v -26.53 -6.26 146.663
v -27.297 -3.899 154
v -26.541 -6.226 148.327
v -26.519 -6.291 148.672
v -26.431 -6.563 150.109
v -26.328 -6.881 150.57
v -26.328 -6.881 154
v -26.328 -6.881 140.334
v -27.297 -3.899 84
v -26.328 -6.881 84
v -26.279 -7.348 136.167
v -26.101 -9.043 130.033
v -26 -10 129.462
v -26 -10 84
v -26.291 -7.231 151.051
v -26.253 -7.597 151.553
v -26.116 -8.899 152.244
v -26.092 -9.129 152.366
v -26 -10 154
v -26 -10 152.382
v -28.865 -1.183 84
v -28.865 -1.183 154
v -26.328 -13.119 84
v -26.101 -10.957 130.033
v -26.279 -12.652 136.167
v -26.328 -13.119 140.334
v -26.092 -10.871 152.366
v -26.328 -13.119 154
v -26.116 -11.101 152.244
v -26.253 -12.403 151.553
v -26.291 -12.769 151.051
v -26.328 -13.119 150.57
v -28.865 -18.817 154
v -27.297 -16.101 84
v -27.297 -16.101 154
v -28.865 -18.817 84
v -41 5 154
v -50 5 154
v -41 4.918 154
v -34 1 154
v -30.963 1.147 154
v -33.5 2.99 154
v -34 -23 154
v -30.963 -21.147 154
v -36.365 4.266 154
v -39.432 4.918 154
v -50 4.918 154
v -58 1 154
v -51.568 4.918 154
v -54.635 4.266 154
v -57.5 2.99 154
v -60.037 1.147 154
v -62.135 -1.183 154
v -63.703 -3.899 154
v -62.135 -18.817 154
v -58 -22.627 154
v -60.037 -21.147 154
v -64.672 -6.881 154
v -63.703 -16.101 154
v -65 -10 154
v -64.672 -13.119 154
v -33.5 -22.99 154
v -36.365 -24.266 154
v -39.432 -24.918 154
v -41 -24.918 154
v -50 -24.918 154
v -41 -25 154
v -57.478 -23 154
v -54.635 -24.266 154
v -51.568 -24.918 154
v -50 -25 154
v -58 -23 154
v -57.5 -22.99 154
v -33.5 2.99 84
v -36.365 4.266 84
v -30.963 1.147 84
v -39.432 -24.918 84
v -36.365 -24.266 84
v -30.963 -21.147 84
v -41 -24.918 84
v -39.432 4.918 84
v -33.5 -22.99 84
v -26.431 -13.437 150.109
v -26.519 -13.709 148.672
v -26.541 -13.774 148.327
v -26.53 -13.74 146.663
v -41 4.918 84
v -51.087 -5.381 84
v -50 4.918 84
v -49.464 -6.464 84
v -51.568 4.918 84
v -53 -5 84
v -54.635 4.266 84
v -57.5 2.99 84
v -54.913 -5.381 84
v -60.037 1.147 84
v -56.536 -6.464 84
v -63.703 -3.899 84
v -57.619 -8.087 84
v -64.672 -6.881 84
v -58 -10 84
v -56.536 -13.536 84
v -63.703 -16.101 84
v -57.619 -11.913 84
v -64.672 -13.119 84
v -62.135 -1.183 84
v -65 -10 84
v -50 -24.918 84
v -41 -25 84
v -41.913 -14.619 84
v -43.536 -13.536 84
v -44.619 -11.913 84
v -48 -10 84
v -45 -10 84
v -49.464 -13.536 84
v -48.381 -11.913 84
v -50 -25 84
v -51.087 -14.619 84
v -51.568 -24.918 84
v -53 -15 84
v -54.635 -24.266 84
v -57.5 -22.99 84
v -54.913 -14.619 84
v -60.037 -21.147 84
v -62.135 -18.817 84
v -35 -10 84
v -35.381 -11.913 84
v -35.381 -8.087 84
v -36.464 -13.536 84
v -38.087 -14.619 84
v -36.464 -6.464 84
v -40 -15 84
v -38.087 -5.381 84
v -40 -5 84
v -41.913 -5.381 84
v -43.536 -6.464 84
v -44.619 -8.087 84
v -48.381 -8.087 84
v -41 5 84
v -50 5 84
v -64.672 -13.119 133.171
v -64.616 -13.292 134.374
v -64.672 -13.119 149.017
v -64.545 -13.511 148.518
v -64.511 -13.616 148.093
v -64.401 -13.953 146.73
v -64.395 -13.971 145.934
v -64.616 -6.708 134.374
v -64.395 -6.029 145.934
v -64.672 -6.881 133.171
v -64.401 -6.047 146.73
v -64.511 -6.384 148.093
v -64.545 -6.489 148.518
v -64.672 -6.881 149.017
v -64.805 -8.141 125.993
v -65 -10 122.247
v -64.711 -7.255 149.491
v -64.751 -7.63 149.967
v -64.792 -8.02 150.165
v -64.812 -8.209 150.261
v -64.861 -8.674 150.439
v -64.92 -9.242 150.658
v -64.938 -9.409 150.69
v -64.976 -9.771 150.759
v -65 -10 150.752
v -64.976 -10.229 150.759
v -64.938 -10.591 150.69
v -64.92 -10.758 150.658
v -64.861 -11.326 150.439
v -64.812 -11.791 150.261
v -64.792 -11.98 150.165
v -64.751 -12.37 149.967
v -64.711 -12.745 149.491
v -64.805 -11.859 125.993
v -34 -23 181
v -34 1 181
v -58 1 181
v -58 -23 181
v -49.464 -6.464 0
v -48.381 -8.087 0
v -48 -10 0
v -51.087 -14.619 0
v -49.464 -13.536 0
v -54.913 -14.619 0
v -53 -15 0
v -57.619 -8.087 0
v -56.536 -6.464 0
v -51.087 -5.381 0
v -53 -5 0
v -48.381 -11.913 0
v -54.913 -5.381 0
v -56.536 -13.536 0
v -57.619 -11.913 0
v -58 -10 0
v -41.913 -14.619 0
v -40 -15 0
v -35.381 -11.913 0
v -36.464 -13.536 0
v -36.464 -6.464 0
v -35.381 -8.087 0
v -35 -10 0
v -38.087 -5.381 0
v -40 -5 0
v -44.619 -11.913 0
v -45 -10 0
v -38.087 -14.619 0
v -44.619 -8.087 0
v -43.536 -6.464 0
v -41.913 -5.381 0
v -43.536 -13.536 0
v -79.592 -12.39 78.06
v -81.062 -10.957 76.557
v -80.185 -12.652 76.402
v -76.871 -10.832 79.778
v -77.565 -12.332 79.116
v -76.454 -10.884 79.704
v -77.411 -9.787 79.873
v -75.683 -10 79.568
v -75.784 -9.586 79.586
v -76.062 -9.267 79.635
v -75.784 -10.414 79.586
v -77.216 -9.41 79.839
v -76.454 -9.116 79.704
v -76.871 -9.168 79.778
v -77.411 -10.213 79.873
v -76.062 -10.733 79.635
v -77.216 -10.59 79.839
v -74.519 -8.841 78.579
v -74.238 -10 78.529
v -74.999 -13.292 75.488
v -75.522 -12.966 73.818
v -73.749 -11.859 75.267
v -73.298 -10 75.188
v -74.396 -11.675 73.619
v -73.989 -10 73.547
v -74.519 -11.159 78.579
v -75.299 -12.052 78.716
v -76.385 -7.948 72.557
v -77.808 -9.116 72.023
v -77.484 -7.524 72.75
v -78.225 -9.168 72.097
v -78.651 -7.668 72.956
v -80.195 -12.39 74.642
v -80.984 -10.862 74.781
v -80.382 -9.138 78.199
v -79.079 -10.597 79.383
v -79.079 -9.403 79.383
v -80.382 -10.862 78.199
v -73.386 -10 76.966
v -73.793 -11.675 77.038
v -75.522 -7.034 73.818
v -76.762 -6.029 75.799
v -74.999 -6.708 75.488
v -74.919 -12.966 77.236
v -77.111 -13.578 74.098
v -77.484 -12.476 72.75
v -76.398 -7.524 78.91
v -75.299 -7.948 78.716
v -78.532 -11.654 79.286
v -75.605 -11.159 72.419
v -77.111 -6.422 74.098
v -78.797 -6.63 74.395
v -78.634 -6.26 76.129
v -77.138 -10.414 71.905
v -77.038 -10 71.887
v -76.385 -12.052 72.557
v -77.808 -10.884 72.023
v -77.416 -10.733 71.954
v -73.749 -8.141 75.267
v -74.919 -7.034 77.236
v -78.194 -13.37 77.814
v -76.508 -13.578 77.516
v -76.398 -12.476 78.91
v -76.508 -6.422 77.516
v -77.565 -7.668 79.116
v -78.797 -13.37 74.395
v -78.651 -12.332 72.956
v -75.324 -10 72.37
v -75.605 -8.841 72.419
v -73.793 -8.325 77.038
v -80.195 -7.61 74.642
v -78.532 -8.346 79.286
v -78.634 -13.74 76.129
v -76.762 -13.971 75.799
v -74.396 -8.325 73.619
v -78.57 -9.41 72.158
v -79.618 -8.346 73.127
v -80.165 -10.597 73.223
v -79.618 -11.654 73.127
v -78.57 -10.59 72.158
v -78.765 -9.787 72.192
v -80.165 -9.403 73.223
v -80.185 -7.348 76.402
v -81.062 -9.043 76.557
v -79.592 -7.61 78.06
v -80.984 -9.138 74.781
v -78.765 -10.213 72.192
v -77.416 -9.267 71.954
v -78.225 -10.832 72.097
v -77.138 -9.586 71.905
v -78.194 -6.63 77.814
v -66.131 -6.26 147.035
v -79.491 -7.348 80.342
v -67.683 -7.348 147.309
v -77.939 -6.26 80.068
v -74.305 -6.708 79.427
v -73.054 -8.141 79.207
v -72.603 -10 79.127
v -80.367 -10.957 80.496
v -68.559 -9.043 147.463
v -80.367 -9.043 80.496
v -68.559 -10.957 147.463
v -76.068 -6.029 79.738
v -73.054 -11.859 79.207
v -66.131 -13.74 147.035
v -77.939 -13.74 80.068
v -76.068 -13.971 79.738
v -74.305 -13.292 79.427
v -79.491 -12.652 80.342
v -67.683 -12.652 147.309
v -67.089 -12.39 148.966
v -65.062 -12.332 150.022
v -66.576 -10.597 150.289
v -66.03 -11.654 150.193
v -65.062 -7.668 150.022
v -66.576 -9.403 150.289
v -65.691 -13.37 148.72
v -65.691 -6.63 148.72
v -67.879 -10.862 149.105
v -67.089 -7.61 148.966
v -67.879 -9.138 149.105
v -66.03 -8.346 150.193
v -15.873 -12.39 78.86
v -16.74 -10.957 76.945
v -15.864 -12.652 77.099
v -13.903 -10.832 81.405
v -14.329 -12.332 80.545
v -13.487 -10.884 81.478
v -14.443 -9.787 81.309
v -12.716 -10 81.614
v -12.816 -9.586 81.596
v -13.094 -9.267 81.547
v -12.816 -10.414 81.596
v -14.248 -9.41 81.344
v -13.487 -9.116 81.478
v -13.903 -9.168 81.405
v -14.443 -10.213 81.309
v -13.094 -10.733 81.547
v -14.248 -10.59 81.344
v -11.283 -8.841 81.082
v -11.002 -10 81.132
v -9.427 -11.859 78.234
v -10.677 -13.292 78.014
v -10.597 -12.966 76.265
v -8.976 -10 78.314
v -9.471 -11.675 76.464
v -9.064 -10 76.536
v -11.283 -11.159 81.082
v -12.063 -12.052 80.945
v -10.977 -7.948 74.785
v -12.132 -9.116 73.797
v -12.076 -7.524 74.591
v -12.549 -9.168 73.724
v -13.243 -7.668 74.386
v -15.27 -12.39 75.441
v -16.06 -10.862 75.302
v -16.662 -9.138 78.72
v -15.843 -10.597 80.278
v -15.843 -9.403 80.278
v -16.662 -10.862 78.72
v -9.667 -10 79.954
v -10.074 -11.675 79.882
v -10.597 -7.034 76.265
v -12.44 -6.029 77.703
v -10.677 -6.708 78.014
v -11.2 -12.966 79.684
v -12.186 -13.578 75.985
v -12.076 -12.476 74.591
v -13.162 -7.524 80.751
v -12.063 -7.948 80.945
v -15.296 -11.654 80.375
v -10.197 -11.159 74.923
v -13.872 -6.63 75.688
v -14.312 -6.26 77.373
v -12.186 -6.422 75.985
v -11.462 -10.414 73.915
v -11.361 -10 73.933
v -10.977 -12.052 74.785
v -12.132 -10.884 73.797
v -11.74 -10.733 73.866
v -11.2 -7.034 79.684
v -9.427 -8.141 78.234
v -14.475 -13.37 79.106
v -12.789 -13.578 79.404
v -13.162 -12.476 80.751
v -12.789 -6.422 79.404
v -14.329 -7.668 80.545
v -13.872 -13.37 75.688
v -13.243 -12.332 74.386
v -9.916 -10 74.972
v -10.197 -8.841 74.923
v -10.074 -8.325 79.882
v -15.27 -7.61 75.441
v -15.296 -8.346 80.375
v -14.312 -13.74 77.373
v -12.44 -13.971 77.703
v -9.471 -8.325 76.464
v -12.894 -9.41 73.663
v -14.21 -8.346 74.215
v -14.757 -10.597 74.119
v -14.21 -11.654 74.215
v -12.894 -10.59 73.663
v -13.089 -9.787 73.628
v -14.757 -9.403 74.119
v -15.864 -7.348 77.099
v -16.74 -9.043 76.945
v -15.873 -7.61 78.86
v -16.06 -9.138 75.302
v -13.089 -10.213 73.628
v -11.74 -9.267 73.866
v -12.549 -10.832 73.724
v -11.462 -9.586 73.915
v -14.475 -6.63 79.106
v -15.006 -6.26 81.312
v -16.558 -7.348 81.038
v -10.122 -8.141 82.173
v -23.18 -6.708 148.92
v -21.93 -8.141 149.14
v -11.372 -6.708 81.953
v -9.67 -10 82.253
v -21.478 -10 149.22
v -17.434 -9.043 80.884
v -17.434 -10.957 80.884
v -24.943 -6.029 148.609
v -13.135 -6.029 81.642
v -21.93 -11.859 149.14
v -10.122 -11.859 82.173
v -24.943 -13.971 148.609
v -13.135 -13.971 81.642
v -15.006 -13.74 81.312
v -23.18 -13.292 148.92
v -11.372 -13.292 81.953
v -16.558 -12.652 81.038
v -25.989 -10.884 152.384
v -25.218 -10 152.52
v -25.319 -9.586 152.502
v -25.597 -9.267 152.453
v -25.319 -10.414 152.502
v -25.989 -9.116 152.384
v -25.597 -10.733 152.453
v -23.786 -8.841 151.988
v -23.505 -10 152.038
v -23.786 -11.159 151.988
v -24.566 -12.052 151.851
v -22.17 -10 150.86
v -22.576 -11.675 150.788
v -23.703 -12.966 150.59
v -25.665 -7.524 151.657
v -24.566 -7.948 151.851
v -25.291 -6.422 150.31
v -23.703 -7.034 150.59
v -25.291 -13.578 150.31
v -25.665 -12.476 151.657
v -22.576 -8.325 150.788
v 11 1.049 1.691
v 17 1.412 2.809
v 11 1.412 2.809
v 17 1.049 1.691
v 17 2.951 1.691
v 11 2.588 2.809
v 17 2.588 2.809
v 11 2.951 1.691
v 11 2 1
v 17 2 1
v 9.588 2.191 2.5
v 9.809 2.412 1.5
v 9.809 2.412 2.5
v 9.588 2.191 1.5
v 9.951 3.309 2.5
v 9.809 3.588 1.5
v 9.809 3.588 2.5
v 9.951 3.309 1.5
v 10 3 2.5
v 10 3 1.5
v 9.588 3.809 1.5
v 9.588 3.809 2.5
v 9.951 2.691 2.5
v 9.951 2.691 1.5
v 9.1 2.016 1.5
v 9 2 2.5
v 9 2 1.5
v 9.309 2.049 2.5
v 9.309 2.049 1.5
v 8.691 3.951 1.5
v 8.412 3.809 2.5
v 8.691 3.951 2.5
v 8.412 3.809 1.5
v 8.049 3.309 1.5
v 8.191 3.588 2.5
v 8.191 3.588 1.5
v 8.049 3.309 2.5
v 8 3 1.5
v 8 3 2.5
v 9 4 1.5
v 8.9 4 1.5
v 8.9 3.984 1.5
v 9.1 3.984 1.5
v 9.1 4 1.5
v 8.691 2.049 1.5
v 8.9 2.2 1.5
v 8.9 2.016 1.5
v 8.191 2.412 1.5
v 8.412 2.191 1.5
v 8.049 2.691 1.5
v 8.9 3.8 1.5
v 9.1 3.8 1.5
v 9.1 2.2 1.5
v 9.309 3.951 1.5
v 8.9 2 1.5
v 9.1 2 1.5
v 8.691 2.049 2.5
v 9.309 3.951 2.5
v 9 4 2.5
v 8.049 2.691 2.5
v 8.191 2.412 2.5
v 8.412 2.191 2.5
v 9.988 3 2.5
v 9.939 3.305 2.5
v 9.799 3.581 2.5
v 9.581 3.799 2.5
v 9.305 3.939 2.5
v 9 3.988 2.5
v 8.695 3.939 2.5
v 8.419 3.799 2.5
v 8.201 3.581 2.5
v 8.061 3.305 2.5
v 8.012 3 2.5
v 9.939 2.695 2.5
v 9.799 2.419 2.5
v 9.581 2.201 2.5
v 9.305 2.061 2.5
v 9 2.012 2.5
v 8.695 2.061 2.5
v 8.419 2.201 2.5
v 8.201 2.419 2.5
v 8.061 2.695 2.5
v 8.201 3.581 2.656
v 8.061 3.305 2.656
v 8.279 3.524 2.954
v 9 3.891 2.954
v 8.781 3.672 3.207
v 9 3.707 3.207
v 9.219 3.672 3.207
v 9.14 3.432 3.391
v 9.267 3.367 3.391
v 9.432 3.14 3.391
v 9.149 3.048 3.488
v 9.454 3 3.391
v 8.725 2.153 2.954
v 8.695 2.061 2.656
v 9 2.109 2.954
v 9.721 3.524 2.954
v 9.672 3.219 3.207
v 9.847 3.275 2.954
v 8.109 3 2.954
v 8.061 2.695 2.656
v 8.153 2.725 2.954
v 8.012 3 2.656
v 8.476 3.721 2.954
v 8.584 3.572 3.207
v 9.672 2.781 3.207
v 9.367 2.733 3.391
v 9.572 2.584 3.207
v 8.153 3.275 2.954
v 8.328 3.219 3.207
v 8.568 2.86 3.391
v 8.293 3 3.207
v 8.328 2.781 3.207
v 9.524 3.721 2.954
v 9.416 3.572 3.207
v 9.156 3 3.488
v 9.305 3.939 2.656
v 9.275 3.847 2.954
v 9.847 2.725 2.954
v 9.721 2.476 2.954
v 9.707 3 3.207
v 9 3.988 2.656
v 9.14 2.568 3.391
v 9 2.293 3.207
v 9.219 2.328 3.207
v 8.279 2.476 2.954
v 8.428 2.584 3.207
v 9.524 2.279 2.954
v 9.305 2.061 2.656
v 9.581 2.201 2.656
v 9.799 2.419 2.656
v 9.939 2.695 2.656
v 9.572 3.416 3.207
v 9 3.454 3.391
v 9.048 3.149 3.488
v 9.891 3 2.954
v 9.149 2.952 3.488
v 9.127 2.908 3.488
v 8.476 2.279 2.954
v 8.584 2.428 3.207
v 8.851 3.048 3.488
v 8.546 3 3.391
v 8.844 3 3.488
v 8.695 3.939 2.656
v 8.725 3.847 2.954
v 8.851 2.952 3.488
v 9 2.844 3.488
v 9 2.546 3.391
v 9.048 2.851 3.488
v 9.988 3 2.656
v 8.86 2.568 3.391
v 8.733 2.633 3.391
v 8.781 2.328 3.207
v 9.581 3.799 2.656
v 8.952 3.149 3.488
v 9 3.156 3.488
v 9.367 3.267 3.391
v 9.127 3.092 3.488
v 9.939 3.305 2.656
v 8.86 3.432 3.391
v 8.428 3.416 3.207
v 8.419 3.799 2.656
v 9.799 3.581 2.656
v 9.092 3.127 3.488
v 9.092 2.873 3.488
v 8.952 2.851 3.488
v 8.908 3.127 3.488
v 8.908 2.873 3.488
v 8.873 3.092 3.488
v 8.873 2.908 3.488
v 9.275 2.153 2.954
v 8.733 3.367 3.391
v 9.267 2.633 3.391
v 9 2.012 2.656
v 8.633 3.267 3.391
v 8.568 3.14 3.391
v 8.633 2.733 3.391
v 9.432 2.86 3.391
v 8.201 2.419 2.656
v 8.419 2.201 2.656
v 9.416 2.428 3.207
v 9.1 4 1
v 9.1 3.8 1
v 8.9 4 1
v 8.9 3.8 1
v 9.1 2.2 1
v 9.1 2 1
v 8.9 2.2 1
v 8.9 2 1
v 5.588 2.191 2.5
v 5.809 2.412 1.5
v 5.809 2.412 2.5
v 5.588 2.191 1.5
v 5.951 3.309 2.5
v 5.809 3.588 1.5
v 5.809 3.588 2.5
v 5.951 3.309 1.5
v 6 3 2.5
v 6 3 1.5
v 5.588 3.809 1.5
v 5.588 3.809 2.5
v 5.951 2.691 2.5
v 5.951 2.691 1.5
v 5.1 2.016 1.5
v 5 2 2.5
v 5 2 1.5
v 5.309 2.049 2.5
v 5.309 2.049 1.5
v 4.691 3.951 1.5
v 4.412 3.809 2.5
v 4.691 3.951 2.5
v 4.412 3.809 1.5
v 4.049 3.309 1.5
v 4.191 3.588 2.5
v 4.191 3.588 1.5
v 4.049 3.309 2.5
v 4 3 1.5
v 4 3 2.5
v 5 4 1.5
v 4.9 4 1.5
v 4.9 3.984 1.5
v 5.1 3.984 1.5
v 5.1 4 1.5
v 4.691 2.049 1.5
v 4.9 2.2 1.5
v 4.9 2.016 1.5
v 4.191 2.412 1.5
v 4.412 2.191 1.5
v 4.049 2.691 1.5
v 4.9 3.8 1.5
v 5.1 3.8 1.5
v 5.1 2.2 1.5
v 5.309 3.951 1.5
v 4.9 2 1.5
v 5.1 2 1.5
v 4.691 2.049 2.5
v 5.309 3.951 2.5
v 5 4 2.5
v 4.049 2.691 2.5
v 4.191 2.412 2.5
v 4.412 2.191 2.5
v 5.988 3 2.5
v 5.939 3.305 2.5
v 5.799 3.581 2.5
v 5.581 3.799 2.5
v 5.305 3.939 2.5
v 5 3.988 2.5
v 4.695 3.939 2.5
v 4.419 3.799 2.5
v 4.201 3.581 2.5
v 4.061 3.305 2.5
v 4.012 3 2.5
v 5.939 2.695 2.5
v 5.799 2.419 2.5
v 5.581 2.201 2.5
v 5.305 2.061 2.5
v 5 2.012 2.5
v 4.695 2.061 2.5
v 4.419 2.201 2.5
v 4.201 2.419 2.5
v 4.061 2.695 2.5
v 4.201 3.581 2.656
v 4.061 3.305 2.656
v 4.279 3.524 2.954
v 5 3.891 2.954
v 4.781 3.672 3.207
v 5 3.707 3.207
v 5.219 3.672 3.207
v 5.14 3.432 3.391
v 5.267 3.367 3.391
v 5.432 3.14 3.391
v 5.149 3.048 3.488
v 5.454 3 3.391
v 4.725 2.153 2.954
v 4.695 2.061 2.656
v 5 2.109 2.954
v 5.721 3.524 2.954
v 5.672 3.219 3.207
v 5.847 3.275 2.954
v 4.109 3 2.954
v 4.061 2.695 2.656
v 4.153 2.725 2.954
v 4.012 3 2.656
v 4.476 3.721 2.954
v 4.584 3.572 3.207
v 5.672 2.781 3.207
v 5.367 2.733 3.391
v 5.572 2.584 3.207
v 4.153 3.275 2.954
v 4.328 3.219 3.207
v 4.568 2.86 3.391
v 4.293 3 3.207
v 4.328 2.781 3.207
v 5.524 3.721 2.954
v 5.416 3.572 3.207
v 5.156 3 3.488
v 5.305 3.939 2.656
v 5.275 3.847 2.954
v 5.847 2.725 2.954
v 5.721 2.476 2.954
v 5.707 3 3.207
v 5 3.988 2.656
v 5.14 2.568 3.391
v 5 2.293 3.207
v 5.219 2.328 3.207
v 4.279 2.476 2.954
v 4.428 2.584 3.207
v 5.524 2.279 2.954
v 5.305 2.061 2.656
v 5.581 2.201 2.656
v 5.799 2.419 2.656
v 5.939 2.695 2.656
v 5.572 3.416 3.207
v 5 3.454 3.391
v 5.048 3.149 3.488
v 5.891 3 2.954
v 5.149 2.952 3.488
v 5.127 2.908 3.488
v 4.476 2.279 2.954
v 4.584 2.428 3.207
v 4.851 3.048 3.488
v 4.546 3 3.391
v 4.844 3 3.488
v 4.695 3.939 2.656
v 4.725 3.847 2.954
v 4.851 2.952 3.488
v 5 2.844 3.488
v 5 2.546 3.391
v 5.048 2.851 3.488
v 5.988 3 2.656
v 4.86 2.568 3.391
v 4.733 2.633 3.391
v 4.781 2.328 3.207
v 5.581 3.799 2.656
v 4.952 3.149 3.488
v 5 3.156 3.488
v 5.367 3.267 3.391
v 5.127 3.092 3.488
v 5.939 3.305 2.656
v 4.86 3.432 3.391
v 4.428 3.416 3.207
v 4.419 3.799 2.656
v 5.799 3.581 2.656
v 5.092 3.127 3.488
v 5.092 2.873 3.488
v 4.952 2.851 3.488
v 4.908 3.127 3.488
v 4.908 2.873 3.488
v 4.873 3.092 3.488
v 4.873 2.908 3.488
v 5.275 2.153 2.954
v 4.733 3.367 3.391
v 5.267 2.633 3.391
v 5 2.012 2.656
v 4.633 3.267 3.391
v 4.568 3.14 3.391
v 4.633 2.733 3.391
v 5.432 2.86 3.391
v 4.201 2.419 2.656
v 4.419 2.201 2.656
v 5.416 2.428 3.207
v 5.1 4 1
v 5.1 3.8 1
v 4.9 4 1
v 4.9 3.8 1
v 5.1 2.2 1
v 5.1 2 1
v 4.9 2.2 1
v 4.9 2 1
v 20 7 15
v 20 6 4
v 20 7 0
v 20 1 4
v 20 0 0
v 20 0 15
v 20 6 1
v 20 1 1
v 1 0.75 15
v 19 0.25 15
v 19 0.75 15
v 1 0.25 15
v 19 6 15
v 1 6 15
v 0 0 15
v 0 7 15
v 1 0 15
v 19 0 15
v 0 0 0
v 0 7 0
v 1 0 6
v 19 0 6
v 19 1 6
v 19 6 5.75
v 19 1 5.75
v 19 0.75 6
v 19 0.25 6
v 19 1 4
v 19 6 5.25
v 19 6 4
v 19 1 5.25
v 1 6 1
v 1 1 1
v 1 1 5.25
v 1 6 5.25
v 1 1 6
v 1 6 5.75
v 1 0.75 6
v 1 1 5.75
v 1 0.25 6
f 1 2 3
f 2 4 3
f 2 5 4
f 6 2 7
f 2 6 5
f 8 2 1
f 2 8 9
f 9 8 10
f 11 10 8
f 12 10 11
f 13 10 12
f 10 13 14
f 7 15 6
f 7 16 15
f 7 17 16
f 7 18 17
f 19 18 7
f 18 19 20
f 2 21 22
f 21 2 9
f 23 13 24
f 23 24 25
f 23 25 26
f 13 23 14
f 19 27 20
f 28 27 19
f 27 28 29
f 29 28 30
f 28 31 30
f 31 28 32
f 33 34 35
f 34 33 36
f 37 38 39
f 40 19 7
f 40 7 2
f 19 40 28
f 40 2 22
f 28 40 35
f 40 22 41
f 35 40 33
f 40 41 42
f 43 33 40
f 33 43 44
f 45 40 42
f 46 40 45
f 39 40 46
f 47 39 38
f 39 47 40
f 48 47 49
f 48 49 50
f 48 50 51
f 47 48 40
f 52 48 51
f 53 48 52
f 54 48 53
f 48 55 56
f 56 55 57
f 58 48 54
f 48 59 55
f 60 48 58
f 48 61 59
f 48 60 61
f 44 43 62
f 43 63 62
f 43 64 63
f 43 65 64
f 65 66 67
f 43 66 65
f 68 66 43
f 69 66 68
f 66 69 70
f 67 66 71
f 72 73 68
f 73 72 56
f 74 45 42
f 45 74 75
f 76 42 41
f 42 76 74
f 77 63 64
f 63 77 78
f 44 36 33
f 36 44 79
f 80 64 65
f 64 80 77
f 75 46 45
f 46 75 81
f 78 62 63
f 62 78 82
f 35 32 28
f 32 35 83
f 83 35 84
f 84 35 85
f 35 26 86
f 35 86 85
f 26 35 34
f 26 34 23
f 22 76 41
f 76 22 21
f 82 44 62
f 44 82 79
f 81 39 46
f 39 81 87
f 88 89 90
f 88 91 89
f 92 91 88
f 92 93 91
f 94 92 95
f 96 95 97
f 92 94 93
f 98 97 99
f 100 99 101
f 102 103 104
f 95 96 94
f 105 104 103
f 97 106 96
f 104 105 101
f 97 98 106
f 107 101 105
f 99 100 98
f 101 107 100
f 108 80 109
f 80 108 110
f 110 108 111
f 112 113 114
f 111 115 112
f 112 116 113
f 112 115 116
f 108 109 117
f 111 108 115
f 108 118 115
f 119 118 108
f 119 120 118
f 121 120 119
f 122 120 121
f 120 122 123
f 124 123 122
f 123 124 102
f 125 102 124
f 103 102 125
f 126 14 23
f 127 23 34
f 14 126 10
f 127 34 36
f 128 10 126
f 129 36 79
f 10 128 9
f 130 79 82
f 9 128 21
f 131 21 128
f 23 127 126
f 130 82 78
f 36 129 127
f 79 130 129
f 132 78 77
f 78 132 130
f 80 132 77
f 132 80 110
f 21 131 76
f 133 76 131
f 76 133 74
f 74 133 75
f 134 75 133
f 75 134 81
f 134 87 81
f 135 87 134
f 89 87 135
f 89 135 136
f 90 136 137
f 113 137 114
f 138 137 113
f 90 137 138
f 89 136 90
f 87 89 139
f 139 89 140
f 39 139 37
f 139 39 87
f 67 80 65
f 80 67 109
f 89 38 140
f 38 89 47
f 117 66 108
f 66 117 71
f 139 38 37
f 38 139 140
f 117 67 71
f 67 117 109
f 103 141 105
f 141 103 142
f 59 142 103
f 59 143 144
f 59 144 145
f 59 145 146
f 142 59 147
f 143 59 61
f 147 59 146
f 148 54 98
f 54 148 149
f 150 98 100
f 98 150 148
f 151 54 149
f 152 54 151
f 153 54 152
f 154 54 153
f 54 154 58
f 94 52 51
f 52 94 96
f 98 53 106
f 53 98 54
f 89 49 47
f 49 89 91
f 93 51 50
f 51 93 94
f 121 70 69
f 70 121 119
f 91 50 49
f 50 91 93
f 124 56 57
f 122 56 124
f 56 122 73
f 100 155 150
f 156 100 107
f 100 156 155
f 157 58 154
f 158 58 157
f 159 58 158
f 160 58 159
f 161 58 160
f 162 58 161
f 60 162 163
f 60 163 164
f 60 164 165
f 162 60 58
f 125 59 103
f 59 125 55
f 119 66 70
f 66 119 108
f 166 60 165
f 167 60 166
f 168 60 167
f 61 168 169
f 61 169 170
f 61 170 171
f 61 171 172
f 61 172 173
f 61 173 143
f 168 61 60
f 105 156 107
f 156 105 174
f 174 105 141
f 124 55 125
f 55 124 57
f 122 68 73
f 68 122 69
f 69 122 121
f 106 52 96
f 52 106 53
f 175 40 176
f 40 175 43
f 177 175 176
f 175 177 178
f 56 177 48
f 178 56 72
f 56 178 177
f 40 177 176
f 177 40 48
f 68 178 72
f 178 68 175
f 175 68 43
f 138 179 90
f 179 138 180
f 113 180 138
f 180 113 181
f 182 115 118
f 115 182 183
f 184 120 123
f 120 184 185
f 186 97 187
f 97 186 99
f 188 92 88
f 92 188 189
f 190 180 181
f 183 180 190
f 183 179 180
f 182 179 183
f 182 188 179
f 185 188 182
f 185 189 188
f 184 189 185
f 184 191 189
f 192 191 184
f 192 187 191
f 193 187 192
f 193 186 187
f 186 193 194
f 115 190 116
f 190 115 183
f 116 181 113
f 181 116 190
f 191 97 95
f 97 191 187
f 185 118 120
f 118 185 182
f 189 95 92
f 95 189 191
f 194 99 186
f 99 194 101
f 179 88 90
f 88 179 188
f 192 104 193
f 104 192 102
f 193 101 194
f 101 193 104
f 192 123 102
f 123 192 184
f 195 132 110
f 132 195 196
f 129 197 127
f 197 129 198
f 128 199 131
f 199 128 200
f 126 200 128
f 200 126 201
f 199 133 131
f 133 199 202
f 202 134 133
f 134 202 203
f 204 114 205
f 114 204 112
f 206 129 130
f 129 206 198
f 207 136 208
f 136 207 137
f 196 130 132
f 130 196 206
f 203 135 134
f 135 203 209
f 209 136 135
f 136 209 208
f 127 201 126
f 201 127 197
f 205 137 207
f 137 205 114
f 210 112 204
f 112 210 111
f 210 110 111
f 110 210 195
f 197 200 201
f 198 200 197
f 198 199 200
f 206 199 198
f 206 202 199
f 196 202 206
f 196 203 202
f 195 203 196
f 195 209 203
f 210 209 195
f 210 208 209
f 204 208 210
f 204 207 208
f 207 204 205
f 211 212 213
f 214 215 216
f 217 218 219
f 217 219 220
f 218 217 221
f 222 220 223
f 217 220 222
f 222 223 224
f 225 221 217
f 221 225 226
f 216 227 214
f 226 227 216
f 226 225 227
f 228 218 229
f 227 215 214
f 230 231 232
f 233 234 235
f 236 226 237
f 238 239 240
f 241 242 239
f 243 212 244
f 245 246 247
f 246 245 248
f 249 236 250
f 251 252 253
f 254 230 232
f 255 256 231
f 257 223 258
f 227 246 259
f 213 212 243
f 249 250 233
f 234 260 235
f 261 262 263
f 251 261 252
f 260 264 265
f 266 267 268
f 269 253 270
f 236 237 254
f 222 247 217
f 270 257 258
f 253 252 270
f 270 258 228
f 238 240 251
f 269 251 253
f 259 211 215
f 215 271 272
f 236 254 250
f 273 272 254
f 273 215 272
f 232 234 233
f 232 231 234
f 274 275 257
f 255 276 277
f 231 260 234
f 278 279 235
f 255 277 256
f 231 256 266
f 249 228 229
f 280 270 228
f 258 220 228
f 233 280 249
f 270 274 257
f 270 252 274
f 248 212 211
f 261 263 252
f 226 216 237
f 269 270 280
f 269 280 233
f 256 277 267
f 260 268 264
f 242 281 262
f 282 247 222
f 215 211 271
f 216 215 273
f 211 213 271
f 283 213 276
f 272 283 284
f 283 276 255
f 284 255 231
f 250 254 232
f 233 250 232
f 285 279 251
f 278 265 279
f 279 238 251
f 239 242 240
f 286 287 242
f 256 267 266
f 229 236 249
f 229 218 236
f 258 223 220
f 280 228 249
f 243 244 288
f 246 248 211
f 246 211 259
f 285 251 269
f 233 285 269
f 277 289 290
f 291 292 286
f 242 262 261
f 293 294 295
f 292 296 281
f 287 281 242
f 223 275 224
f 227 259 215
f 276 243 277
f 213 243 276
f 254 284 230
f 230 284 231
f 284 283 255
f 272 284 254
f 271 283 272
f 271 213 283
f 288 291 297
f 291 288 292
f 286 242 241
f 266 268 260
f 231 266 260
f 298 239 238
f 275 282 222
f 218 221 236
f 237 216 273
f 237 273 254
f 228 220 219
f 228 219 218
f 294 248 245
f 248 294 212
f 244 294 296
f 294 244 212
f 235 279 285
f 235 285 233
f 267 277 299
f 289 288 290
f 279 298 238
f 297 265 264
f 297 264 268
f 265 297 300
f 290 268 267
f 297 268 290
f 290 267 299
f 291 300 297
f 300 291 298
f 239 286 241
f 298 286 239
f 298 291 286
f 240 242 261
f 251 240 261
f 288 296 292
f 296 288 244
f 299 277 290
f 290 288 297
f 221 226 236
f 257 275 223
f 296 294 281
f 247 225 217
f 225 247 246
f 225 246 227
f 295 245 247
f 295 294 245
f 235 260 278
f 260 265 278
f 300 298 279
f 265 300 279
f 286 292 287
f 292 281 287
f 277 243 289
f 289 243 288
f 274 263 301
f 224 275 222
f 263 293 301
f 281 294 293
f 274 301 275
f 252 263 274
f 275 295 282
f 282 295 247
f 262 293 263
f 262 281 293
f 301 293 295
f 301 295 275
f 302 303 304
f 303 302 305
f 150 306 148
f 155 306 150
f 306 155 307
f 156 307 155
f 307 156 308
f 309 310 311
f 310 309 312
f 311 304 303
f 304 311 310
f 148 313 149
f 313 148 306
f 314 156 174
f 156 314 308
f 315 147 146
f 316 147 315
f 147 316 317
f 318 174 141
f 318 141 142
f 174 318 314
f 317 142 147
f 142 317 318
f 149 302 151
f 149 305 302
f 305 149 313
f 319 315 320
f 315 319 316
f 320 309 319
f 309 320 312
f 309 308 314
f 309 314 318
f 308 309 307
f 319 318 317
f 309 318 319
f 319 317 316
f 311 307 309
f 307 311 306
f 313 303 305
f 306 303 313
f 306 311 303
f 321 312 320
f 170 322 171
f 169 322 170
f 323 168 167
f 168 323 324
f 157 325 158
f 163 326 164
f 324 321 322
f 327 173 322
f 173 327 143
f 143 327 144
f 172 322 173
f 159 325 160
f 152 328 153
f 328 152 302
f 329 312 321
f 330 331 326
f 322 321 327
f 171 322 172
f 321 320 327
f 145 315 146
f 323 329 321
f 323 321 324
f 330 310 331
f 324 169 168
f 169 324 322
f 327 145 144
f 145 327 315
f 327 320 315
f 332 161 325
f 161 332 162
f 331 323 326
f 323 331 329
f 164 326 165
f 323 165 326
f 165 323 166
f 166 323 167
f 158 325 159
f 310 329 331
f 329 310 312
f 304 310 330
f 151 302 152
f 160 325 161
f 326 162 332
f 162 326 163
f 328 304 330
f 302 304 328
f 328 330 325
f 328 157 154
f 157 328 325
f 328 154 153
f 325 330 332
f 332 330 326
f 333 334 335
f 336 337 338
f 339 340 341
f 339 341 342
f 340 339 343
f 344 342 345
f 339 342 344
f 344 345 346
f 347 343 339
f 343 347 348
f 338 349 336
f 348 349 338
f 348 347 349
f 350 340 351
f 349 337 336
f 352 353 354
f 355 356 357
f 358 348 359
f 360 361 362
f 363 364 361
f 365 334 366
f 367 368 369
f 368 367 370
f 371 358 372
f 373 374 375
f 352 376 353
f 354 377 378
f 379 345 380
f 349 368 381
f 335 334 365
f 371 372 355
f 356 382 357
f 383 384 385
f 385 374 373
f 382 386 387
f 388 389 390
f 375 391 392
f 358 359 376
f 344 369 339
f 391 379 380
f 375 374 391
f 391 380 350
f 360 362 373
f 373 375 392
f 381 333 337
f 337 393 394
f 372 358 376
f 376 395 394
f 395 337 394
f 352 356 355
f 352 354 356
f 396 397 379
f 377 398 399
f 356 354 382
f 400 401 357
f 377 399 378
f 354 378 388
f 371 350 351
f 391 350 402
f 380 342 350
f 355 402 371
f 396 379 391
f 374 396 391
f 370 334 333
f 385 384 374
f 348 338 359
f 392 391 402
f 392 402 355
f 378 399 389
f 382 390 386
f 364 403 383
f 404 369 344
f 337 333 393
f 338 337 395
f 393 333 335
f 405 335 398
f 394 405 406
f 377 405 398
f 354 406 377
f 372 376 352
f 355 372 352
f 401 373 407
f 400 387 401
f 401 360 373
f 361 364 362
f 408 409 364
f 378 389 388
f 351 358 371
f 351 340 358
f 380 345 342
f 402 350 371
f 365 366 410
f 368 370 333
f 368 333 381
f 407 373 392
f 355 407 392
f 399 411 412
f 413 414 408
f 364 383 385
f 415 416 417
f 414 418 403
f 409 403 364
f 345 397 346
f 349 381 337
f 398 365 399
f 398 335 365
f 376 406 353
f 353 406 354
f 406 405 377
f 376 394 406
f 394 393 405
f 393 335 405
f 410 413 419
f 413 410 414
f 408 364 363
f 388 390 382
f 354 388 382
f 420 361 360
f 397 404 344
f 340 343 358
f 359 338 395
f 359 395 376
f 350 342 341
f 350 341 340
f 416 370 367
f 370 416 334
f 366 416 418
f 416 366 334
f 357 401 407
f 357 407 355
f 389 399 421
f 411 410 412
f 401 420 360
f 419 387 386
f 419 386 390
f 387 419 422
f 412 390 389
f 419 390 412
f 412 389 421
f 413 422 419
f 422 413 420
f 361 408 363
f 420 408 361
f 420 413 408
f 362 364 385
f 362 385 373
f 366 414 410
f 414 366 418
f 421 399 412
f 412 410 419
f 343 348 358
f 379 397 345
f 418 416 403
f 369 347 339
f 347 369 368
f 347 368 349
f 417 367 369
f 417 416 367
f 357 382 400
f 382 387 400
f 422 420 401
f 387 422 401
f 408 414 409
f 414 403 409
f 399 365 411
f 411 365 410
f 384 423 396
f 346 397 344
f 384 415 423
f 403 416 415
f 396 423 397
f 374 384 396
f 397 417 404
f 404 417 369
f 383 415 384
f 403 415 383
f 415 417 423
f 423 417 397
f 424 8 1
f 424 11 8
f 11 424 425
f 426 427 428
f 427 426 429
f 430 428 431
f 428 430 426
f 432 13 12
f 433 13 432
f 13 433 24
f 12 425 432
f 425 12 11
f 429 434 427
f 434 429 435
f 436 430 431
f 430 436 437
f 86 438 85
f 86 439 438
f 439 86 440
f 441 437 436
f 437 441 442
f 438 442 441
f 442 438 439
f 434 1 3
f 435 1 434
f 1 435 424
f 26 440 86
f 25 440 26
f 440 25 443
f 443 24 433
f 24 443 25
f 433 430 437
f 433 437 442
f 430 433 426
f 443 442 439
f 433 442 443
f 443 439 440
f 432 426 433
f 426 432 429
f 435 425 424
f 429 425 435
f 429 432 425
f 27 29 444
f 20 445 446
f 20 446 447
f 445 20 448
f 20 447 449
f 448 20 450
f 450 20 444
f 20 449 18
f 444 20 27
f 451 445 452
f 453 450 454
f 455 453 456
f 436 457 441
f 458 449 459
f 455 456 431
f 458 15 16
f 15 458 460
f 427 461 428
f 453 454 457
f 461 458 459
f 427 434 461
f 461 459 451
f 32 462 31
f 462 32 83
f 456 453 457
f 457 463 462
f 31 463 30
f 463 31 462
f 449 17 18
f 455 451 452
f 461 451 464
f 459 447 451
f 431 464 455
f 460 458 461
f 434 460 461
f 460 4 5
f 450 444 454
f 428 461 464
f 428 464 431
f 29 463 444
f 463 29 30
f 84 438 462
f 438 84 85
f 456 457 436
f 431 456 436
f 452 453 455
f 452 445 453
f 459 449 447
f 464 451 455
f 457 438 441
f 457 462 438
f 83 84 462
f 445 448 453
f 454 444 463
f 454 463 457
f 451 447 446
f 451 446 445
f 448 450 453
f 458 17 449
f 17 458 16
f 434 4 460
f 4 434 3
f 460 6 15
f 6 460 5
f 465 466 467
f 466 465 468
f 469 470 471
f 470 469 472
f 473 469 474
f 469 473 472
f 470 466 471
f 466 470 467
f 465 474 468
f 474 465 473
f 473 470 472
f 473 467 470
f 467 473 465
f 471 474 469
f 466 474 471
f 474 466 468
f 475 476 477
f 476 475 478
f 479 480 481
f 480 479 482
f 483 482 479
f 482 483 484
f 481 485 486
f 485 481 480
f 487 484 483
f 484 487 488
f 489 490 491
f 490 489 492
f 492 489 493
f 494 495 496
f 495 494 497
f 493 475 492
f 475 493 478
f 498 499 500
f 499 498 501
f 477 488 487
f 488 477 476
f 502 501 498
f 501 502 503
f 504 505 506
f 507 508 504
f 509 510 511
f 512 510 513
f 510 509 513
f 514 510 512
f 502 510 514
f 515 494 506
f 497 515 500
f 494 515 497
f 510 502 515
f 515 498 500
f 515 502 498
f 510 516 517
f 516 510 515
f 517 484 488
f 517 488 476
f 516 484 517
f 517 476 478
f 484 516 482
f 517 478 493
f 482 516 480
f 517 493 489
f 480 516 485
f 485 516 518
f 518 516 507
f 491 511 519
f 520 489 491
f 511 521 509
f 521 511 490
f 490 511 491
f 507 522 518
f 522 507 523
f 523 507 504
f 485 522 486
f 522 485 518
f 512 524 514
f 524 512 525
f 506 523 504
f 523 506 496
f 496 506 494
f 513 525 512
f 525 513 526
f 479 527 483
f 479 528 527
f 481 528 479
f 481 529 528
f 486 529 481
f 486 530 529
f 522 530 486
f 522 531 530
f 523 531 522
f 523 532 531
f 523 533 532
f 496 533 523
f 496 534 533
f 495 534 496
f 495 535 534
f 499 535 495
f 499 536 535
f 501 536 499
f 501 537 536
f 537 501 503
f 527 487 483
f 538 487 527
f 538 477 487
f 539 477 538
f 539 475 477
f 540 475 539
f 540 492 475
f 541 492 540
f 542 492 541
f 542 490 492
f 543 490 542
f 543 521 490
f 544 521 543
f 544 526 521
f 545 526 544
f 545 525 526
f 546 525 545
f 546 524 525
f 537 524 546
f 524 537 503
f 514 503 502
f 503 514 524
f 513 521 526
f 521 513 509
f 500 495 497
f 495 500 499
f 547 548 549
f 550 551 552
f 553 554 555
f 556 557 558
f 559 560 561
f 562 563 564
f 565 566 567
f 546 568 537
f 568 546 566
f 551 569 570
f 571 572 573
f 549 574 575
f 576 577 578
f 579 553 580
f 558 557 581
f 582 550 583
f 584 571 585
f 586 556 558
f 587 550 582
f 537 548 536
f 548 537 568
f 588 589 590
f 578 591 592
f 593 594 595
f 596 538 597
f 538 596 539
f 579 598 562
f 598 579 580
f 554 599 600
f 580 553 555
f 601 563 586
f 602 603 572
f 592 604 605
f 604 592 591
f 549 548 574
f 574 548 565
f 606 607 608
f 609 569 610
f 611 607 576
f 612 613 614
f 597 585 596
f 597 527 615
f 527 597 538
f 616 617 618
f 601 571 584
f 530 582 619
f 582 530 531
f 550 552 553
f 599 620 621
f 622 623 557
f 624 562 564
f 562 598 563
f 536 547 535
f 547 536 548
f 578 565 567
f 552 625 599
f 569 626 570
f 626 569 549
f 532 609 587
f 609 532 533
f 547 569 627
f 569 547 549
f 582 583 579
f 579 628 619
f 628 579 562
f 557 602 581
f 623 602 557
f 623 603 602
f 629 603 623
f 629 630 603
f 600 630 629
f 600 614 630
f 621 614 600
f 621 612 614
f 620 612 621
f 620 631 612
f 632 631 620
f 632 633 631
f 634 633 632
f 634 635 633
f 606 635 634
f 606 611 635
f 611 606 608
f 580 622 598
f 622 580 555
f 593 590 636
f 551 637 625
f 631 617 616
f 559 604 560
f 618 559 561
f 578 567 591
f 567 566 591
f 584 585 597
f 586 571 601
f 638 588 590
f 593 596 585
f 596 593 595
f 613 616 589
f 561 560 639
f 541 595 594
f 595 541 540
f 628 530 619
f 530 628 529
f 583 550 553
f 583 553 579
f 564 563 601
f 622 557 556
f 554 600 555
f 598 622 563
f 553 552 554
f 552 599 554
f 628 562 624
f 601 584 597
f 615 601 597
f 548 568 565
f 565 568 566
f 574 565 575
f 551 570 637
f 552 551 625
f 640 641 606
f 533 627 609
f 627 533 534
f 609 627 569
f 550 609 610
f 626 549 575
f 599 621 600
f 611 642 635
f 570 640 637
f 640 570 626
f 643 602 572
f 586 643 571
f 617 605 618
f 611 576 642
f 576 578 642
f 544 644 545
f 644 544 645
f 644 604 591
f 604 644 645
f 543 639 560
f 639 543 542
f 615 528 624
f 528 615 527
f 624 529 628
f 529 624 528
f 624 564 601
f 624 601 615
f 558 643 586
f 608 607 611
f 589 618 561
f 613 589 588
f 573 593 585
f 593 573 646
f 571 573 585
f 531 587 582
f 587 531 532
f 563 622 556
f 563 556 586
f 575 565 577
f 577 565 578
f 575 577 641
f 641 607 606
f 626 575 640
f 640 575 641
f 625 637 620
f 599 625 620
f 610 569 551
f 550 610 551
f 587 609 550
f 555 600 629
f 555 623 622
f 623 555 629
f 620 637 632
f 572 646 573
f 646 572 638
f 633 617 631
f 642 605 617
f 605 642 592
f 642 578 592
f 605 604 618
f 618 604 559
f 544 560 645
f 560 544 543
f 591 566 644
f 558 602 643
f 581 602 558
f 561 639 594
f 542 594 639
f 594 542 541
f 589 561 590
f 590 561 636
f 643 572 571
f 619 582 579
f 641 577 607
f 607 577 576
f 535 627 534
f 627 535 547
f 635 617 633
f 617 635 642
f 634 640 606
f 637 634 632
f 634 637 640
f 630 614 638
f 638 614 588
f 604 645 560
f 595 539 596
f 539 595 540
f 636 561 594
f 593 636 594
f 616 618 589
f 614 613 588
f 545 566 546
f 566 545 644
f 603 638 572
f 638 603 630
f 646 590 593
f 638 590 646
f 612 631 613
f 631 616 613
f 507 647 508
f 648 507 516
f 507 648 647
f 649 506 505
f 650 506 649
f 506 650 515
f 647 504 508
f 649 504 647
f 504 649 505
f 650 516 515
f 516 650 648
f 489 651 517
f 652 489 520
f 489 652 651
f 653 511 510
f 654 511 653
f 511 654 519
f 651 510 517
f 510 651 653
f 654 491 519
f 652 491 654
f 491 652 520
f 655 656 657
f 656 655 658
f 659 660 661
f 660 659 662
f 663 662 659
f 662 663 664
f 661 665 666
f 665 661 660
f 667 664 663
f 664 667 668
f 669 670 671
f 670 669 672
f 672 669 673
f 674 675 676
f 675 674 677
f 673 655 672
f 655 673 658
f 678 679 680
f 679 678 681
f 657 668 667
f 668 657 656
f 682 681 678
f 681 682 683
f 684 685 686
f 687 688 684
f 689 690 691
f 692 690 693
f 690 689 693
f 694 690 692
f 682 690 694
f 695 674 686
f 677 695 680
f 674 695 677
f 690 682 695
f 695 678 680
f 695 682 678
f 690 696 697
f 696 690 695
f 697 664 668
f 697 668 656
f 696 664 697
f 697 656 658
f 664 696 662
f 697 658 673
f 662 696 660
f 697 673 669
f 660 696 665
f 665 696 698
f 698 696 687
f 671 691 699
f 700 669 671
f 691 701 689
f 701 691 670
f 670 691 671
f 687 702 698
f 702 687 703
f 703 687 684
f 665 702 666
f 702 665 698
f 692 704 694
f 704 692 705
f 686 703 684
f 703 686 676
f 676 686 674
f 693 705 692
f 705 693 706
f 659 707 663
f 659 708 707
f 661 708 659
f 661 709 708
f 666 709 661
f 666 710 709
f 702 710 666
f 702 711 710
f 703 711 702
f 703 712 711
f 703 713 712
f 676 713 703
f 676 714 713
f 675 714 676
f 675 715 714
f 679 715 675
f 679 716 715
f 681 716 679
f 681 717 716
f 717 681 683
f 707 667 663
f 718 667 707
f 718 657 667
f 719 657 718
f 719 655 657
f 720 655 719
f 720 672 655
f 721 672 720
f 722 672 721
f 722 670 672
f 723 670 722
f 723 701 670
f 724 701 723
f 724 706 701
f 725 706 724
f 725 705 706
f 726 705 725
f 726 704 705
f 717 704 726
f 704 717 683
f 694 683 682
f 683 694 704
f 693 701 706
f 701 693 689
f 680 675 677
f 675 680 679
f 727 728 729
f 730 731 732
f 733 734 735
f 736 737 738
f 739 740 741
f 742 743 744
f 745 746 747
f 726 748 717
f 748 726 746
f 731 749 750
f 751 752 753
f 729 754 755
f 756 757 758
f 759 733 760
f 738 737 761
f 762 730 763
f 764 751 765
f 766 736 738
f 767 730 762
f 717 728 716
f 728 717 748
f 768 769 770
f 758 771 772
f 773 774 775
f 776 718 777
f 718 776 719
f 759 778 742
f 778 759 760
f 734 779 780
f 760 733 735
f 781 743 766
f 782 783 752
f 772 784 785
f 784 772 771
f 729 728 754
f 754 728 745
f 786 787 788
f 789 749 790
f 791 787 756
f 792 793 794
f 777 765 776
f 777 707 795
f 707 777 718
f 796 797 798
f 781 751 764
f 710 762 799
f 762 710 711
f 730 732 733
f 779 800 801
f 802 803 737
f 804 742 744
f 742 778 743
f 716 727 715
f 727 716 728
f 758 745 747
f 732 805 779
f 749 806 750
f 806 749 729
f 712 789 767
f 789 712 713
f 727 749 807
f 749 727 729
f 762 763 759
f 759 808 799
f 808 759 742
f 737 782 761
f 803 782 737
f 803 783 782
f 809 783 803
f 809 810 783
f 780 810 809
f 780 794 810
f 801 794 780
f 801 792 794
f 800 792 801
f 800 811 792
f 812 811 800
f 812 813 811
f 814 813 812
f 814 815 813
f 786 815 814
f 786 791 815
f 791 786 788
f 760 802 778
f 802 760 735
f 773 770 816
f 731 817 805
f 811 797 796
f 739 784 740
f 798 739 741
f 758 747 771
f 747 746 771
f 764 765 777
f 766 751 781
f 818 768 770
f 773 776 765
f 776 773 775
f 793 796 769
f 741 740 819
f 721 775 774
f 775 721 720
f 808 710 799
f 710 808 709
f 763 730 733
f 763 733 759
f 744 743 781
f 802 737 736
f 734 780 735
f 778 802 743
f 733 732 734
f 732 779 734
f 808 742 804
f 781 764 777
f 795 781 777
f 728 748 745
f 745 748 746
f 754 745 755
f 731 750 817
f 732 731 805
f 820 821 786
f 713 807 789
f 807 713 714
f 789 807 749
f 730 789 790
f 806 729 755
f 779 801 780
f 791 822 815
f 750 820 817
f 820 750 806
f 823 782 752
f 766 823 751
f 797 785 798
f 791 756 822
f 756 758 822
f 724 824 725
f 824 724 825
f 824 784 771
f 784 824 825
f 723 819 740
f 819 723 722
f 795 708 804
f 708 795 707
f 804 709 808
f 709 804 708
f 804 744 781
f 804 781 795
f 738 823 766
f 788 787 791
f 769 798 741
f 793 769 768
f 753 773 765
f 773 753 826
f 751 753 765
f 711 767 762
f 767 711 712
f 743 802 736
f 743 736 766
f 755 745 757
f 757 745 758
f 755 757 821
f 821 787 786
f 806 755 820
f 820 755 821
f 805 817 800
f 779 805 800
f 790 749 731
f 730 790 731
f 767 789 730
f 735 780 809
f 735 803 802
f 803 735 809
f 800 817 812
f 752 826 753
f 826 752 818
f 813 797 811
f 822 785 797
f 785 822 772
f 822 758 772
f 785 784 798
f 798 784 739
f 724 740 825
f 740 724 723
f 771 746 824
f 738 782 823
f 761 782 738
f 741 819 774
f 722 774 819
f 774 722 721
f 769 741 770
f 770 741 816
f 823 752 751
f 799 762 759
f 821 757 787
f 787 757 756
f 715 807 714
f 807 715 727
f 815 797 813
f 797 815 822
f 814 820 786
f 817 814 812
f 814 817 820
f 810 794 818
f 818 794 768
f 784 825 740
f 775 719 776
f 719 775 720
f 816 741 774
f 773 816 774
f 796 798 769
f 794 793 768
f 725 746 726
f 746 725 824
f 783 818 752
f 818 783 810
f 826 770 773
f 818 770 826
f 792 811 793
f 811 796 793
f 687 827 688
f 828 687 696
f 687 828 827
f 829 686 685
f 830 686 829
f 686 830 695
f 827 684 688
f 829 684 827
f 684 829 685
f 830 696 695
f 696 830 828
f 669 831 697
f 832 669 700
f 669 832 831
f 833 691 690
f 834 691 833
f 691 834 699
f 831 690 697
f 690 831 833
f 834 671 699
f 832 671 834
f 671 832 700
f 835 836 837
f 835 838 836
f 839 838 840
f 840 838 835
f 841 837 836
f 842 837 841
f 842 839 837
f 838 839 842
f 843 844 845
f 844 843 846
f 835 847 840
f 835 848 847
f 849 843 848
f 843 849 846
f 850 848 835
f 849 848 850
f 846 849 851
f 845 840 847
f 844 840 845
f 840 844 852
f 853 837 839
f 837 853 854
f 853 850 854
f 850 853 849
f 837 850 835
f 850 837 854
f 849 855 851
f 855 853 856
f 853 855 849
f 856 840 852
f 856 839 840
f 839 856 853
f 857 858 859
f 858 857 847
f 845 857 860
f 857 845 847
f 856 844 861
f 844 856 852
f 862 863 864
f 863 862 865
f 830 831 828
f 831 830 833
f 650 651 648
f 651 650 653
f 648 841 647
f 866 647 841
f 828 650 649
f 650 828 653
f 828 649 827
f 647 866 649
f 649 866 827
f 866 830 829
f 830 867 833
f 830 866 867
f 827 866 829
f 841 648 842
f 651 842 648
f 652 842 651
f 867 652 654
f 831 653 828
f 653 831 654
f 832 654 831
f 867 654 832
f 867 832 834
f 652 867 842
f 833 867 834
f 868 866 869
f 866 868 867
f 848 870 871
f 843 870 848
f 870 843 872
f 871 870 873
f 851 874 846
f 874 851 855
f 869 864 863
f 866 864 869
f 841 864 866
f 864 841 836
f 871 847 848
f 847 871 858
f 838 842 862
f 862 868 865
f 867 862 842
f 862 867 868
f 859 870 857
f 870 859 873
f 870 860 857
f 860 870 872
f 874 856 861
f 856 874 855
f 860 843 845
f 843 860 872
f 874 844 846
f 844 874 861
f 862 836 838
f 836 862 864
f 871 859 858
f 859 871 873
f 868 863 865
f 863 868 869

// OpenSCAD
union() {
	union() {
		translate(v = [-50, -10, 0]) {
			color(c = [0.1000000000, 0.9000000000, 0.1000000000]) {
				union() {
					union() {
						translate(v = [0, 0, 84]) {
							union() {
								cylinder(h = 70, r = 15);
								union() {
									translate(v = [9, 0, 0]) {
										cylinder(h = 70, r = 15);
									}
									translate(v = [0, -15, 0]) {
										cube(size = [9, 30, 70]);
									}
								}
							}
						}
						translate(v = [-8, -13, 154]) {
							cube(size = [24, 24, 27]);
						}
					}
					union() {
						union() {
							translate(v = [-3, 0, 0]) {
								cylinder(h = 84, r = 5);
							}
							translate(v = [13, 0, 0]) {
								translate(v = [-3, 0, 0]) {
									cylinder(h = 84, r = 5);
								}
							}
						}
						union() {
							rotate(a = [0, 10, 0]) {
								translate(v = [-40, 0, 70]) {
									union() {
										union() {
											sphere(r = 4);
											translate(v = [0, 0, 4]) {
												cylinder(h = 68, r = 4);
											}
										}
										translate(v = [0, 0, 72]) {
											sphere(r = 4);
										}
									}
								}
							}
							rotate(a = [0, -10, 0]) {
								translate(v = [50, 0, 70]) {
									union() {
										union() {
											sphere(r = 4);
											translate(v = [0, 0, 4]) {
												cylinder(h = 68, r = 4);
											}
										}
										translate(v = [0, 0, 72]) {
											sphere(r = 4);
										}
									}
								}
							}
						}
					}
				}
			}
		}
		union() {
			translate(v = [11, 2, 2]) {
				rotate(a = [0, 90, 0]) {
					union() {
						color(c = [1, 0, 0]) {
							cylinder(h = 3, r = 1);
						}
						color(c = [0, 0, 0]) {
							translate(v = [0, 0, 3]) {
								cylinder(h = 3, r = 1);
							}
						}
					}
				}
			}
			translate(v = [9, 3, 1.5000000000]) {
				color(c = [1.0000000000, 0.4980392157, 0.0000000000]) {
					union() {
						union() {
							cylinder($fn = 20, h = 1, r = 1);
							translate(v = [0, 0, 1]) {
								sphere(r = 1, $fn = 20);
							}
						}
						union() {
							translate(v = [-0.1000000000, 0.8000000000, -1]) {
								cube(size = [0.2000000000, 0.2000000000, 1]);
							}
							translate(v = [-0.1000000000, -1, -1]) {
								cube(size = [0.2000000000, 0.2000000000, 1]);
							}
						}
					}
				}
			}
		}
	}
	union() {
		translate(v = [5, 3, 1.5000000000]) {
			color(c = [1.0000000000, 0.4980392157, 0.0000000000]) {
				union() {
					union() {
						cylinder($fn = 20, h = 1, r = 1);
						translate(v = [0, 0, 1]) {
							sphere(r = 1, $fn = 20);
						}
					}
					union() {
						translate(v = [-0.1000000000, 0.8000000000, -1]) {
							cube(size = [0.2000000000, 0.2000000000, 1]);
						}
						translate(v = [-0.1000000000, -1, -1]) {
							cube(size = [0.2000000000, 0.2000000000, 1]);
						}
					}
				}
			}
		}
		union() {
			color(c = [0, 0.5000000000, 9]) {
				difference() {
					difference() {
						difference() {
							difference() {
								difference() {
									cube(size = [20, 7, 15]);
									translate(v = [1, 1, 1]) {
										cube(size = [18, 5, 15]);
									}
								}
								translate(v = [1, -1, 6]) {
									cube(size = [18, 3, 10]);
								}
							}
							translate(v = [0.5000000000, 0.2500000000, 5.5000000000]) {
								cube(size = [19, 0.5000000000, 10]);
							}
						}
						translate(v = [1, 1, 1]) {
							cube(size = [20, 5, 3]);
						}
					}
					translate(v = [0.5000000000, 0.5000000000, 5.2500000000]) {
						cube(size = [20, 6, 0.5000000000]);
					}
				}
			}
			color(c = [1, 1, 1, 0.2000000000]) {
				union() {
					translate(v = [0.5000000000, 0.2500000000, 5.5000000000]) {
						cube(size = [19, 0.5000000000, 9.5000000000]);
					}
					translate(v = [0.5000000000, 0.5000000000, 5.2500000000]) {
						cube(size = [19.5000000000, 6, 0.5000000000]);
					}
				}
			}
		}
	}
}
